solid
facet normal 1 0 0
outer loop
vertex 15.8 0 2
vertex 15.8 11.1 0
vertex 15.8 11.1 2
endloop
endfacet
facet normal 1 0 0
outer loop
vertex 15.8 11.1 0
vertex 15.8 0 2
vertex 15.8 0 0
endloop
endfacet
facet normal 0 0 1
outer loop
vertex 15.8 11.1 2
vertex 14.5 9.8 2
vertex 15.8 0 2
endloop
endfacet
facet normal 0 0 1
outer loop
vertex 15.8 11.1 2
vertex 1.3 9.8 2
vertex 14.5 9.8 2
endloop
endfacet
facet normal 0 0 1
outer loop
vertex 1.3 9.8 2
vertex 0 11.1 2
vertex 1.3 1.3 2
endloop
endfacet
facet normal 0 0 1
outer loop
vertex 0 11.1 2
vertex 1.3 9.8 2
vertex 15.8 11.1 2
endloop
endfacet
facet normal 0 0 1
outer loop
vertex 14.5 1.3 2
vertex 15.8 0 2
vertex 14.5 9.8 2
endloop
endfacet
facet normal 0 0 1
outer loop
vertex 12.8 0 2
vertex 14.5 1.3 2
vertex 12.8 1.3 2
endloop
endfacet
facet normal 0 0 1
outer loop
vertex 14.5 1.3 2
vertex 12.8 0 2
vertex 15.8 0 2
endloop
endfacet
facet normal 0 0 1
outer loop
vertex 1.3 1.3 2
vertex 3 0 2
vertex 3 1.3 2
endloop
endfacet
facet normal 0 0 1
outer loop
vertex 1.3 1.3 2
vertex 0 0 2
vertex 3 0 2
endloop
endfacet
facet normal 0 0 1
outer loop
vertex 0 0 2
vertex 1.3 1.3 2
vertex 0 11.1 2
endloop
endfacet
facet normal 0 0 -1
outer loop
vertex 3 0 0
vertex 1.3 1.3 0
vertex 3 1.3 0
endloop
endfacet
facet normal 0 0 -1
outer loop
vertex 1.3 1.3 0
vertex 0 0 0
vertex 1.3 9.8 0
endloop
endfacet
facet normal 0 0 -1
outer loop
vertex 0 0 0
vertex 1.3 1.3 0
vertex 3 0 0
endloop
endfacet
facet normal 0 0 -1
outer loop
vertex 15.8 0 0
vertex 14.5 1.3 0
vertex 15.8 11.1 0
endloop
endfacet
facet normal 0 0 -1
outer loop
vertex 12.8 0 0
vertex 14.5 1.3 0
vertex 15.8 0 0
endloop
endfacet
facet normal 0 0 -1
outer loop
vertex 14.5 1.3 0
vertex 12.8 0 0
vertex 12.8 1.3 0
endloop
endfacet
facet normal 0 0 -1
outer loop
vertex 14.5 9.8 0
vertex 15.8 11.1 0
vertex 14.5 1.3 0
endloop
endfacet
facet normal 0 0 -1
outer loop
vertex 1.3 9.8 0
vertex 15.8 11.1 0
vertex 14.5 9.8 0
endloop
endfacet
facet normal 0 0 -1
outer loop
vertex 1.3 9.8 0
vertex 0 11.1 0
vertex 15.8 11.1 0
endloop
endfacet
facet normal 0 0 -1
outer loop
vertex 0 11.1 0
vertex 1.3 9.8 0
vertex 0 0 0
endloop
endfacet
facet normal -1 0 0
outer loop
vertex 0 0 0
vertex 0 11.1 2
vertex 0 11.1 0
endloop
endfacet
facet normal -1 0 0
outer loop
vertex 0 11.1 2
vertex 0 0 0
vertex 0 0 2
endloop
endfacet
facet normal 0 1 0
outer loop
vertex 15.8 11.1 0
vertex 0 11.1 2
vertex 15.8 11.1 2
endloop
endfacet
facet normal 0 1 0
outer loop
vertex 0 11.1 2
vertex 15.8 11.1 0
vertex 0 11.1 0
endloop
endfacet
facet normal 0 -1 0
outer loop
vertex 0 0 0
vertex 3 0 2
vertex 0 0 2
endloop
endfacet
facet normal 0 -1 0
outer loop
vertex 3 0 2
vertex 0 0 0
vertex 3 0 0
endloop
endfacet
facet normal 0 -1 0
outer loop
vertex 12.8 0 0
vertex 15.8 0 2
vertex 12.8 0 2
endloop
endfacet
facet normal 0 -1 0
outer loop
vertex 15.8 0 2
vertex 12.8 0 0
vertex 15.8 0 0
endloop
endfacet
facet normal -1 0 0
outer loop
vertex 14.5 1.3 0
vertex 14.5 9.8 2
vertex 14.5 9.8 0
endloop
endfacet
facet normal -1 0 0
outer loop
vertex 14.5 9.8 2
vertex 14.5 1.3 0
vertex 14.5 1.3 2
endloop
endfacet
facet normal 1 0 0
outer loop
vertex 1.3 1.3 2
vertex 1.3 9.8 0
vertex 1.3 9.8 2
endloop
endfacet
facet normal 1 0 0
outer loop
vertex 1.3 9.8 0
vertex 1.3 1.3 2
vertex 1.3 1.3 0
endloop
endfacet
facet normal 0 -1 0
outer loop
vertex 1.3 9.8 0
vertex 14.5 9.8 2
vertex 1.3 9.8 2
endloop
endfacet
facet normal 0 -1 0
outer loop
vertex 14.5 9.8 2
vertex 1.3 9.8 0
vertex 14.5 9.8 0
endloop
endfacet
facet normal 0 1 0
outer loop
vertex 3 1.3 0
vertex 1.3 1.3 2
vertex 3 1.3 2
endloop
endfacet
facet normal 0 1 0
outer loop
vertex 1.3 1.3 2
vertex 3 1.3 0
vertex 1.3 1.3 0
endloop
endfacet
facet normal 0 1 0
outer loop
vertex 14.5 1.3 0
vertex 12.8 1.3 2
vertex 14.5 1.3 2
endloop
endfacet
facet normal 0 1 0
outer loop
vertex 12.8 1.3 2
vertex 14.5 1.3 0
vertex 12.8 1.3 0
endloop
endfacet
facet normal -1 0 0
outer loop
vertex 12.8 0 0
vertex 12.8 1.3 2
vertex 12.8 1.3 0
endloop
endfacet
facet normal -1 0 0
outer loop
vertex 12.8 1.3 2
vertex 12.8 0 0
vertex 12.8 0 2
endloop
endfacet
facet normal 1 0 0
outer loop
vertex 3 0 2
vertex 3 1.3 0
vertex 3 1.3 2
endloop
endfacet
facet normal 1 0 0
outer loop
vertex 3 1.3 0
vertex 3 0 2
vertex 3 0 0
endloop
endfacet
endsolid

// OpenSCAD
// file: Values.scad
function aPoint(a) = [-sin(dToR(a)), cos(dToR(a))];
function dToR(a) = a * 0.017453;


$fs = 1;
$fa = 5;

// === BASIC CONFIG VALUES - Use for most settings ===
  // Maximum angle that the connector will be able to tilt left
  $angle1 = 0;
  // Minimum angle that the connector will be able to tilt right
  $angle2 = 0;
  // The length that one single piece will extend the cable chain by - set to 0 for minimal
  ChainLinkLength = 150 / 4;
  // Radius of the connector pieces -- affects height of the piece!
  connectorRadius = 4;
  // Width of a chain link piece (inside)
  chainLinkWidth = 8;
  // Size of the gap to insert wires through. Put in 0 for a opened-inwards piece
  gapSize = 0;

// Thickness of the walls of the part - can also be specified separately for the connectors themselves.
wallThickness = 1.2;
// Thickness of the walls to hold the cable. They don't need to be that sturdy
cablewallThickness = 1;

// === CONNECTOR-RELATED CONFIG VALUES ===
  // Length of the slip-preventing wall on the outside of the female connector, set to 0 to disable
  antislipLength = 1.5;
  // Diameter of the click-axis (for click-together type chains)
  clickAxisDiameter = 3;
  // Height of the click-axis pin
  clickAxisHeight = 0.75;
  // Diameter of the filament (for Fila-Axis type chains)
  filamentDiameter = 1.75;
  // Separate config value to tweak the connector thickness.
  connectorThickness = wallThickness;
  // Height of the small wall next to the filament hole
  filamentHoleWallThickness = 1.2;

// Clearing for some of the parts (like between female and male connector)
clearing = 0.2;
// Computational value
$cRadius = connectorRadius;
// Computational value
chainLinkLength = (ChainLinkLength == 0) ? connectorRadius * 2 + connectorThickness + 0.1 : ChainLinkLength;
// Computational value
axisType = "filament";
// main file
include <Values.scad>

wallThickness = 1.3;

clipHeight = 2;

clipClipLength = 1.7;

innerClipWidth = chainLinkWidth + 4*connectorThickness;
outerClipWidth = innerClipWidth + 2*wallThickness;

innerClipHeight = connectorRadius * 2 + 2.5*clearing;
outerClipHeight = innerClipHeight + 2*wallThickness;

module CableClip() {
  difference() {
    cube([outerClipWidth, outerClipHeight, clipHeight]);
    translate([wallThickness, wallThickness, -0.1]) cube([innerClipWidth, innerClipHeight, clipHeight + 0.2]);

    translate([wallThickness + clipClipLength, -0.001, -0.1])
	cube([innerClipWidth - 2*clipClipLength, innerClipHeight + wallThickness, clipHeight + 0.2]);
  }
}

CableClip();
